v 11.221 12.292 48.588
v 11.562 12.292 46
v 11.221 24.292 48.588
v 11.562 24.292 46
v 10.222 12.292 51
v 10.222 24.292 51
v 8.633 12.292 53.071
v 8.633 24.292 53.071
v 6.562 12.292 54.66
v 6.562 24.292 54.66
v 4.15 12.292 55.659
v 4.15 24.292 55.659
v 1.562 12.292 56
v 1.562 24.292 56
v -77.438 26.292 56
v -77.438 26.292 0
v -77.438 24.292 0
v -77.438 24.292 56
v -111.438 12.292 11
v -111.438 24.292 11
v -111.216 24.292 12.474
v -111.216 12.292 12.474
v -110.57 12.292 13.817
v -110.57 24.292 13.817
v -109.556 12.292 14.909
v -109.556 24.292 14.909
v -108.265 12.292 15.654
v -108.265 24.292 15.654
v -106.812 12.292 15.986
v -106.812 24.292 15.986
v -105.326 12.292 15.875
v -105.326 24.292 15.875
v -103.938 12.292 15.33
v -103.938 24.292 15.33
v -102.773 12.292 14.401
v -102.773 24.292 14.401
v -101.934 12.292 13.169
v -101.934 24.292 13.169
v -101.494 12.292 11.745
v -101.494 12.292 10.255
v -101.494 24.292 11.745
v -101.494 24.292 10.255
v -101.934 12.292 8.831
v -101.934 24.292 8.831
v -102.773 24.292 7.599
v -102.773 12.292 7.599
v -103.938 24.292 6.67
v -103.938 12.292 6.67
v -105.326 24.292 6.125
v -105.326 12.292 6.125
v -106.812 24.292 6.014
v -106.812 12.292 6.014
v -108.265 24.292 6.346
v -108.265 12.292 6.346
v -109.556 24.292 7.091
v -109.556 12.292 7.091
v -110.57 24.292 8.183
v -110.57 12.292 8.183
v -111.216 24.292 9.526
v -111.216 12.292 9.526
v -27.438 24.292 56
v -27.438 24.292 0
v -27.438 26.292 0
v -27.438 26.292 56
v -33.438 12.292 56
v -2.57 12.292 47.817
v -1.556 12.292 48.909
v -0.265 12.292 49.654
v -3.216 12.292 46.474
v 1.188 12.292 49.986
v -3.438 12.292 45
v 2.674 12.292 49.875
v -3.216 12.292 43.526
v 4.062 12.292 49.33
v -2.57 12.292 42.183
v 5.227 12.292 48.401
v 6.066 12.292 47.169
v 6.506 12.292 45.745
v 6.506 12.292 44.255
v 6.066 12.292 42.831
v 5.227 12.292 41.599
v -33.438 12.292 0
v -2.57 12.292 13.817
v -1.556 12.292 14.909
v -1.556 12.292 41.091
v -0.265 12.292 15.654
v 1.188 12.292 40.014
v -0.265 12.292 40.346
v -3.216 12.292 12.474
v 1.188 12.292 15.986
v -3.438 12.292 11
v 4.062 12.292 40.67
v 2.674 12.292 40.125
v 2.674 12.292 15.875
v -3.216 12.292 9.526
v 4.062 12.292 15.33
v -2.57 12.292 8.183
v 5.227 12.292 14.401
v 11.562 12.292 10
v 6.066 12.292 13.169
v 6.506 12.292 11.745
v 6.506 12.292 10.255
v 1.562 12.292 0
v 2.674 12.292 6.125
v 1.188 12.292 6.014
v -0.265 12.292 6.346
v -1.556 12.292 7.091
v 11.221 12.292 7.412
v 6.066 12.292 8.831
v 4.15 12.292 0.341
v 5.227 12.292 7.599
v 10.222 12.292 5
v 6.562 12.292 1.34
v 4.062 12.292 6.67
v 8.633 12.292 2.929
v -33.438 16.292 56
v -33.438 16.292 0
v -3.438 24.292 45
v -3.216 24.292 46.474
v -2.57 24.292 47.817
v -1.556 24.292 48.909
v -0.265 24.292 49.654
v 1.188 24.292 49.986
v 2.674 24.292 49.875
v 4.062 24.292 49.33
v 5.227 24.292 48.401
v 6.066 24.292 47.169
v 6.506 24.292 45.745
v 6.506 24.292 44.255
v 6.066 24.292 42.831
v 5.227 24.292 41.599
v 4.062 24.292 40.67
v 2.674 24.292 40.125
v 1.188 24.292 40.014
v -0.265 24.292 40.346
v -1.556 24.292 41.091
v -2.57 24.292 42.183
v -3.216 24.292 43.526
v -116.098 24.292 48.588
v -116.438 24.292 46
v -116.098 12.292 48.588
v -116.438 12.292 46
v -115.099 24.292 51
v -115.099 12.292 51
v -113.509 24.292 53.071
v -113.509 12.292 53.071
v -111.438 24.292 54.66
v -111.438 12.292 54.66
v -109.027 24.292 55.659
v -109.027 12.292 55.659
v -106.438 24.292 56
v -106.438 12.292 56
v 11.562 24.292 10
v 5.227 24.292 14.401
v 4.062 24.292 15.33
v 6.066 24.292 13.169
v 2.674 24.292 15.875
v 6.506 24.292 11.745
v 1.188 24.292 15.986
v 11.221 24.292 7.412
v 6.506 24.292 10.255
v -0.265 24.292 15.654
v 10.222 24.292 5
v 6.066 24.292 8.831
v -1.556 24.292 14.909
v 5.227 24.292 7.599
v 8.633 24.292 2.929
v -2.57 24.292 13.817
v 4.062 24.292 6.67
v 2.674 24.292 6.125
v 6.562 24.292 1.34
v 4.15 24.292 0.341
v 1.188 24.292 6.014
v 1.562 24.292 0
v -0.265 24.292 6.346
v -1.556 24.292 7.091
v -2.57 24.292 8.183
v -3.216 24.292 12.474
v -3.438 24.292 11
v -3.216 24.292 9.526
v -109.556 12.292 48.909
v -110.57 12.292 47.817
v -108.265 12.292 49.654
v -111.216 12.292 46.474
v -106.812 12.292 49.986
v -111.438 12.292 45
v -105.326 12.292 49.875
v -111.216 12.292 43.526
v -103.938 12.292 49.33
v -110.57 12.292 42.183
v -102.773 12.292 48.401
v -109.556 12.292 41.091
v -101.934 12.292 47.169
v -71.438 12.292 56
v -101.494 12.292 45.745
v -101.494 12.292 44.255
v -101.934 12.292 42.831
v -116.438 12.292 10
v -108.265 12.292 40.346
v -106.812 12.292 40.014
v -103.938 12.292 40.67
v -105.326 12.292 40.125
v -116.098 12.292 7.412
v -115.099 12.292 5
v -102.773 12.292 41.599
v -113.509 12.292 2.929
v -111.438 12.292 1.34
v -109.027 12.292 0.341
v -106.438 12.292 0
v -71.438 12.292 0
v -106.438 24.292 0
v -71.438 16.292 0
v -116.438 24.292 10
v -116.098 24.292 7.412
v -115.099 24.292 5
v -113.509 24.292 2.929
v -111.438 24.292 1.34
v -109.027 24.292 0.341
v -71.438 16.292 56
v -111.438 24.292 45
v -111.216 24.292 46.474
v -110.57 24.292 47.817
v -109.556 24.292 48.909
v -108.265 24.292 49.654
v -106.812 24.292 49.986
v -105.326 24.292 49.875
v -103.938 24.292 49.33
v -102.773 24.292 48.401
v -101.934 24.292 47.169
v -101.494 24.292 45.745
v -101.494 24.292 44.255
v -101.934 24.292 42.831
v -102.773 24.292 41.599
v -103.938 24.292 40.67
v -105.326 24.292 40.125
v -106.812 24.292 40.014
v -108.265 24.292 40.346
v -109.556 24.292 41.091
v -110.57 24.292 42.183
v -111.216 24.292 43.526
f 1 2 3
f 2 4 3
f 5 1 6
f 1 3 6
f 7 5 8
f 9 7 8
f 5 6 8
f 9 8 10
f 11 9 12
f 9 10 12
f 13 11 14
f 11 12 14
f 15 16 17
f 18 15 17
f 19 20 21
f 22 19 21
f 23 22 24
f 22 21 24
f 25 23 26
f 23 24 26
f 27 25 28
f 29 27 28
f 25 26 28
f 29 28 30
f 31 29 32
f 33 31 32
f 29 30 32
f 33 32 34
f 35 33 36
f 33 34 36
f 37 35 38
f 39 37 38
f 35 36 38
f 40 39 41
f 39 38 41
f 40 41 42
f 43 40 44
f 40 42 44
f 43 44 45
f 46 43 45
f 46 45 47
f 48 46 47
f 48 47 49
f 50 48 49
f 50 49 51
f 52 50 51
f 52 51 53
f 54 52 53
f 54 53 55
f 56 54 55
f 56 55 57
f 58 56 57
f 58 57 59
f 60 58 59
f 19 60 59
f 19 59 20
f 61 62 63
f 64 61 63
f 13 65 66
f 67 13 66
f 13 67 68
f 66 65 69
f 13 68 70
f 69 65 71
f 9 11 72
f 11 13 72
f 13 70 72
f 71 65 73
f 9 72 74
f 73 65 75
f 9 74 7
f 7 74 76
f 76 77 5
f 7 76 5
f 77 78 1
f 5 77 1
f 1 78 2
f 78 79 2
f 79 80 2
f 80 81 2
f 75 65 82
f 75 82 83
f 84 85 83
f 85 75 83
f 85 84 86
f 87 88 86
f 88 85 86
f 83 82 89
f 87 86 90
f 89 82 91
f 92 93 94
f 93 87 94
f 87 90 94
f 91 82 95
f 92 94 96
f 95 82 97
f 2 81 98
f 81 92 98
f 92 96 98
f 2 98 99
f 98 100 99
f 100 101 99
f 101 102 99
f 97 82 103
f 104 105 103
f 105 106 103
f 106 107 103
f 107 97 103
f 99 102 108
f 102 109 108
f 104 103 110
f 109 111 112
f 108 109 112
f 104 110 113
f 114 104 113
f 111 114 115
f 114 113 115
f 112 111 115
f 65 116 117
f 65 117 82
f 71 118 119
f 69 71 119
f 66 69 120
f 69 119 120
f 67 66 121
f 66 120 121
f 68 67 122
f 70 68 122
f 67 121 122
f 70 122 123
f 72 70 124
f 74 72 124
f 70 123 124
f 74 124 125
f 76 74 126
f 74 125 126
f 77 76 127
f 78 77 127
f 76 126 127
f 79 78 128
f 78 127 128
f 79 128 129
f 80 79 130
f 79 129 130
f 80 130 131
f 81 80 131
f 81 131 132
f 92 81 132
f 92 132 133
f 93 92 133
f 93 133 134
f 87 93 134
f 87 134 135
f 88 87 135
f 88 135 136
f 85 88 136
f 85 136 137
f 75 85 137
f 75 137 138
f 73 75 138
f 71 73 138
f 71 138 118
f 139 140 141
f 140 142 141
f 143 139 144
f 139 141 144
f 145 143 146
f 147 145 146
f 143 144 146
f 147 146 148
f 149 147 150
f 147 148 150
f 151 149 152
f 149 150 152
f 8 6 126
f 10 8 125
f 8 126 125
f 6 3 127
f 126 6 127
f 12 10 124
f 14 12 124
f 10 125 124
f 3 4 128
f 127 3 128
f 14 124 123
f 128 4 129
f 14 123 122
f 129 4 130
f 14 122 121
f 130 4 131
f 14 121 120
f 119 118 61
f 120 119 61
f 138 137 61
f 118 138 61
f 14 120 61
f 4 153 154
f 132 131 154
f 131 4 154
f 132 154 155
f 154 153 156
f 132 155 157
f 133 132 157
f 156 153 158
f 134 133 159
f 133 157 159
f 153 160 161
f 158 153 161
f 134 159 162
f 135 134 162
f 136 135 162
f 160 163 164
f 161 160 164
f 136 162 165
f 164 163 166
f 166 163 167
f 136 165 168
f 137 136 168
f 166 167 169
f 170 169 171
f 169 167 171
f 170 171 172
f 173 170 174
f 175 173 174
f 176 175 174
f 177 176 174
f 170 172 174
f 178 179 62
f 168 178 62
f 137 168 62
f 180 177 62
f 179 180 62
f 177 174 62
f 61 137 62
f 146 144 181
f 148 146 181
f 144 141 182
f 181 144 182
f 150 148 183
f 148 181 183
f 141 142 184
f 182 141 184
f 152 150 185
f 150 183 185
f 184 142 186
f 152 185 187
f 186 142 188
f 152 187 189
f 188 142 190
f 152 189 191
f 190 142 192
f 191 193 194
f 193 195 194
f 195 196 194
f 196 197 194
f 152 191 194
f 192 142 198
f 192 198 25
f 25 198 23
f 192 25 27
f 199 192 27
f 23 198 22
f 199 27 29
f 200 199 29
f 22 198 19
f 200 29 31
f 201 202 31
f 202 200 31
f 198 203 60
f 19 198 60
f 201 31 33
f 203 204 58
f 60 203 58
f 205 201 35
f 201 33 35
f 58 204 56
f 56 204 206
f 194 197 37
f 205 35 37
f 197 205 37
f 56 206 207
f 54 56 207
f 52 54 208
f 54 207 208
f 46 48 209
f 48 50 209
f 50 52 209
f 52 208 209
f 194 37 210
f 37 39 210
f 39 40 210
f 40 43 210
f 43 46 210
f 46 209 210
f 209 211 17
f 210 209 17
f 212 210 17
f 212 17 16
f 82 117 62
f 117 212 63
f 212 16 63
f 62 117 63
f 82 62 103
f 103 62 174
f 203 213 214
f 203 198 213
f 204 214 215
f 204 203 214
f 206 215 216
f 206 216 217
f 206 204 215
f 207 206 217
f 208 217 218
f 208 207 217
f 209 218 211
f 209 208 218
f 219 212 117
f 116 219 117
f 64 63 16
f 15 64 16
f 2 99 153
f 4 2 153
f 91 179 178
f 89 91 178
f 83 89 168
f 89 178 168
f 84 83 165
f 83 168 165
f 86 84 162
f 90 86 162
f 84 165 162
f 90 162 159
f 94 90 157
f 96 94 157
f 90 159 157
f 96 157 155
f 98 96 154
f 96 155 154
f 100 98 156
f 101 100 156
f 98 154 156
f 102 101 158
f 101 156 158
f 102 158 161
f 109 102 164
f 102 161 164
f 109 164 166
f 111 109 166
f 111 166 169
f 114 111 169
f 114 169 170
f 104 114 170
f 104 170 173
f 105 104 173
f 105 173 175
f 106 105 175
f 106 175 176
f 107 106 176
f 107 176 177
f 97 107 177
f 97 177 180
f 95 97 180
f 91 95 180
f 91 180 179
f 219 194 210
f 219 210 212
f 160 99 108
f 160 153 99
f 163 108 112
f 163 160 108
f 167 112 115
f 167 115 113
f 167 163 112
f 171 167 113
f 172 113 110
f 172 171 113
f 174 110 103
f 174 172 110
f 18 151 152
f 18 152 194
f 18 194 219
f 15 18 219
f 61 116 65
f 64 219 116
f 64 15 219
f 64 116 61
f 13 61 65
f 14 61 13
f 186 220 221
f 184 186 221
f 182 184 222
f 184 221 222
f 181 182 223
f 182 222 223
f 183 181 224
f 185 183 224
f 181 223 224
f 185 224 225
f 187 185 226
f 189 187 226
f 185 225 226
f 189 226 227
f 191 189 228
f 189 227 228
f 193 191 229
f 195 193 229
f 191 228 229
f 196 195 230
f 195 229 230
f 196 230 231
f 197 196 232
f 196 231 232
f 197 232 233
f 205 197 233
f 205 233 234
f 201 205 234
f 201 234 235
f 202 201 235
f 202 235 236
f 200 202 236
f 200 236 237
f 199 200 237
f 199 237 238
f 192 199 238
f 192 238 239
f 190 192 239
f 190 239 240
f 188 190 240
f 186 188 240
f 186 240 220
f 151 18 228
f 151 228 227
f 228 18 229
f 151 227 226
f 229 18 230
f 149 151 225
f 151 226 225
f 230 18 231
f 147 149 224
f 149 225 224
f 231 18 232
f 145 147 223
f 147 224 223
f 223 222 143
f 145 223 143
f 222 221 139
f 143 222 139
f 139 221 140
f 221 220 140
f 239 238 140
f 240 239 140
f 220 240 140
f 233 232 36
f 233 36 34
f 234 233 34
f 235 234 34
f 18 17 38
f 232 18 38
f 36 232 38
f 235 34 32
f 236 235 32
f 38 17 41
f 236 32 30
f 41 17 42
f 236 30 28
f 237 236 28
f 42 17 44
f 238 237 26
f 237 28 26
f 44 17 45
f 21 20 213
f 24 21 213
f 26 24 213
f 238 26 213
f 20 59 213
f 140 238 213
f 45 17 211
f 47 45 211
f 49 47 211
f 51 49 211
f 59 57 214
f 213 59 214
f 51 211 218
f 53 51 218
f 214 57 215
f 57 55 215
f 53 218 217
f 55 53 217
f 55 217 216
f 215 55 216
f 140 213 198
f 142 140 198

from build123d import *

# Parameters (mm, degrees)
Y_KSEKLIK_EKSTR_ZYON1_DEPTH = 56
RADYUS1_R                   = 10
IZIM2_R                     = 5
KES_EKSTR_ZYON1_DEPTH       = 130.760913174


with BuildPart() as part:
    # Çizim1 → Yükseklik-Ekstrüzyon1 (new body)
    with BuildSketch(Plane.XY):
        Polygon((-33.438372489, 12.291666667), (11.561627511, 12.291666667), (11.561627511, 24.291666667), (-27.438372489, 24.291666667), (-27.438372489, 26.291666667), (-77.438372489, 26.291666667), (-77.438372489, 24.291666667), (-116.438372489, 24.291666667), (-116.438372489, 12.291666667), (-71.438372489, 12.291666667), (-71.438372489, 16.291666667), (-33.438372489, 16.291666667), align=None)
    extrude(amount=Y_KSEKLIK_EKSTR_ZYON1_DEPTH)

    # Radyus1
    radyus1_edges = [part.edges().sort_by_distance(p)[0] for p in [
        (11.561627511, 18.291666667, 0),
        (-116.438372489, 18.291666667, 0),
        (11.561627511, 18.291666667, 56),
        (-116.438372489, 18.291666667, 56),
    ]]
    fillet(radyus1_edges, radius=RADYUS1_R)

    # Çizim2 → Kes-Ekstrüzyon1 (cut, through all)
    with BuildSketch(Plane(origin=(0, 24.291666667, 0), x_dir=(1, 0, 0), z_dir=(0, 1, 0))):
        with Locations(Location((-106.438372489, -11, 0), (0, 0, 180))):
            Circle(IZIM2_R)
        with Locations(Location((-106.438372489, -45, 0), (0, 0, 180))):
            Circle(IZIM2_R)
        with Locations(Location((1.561627511, -45, 0), (0, 0, 180))):
            Circle(IZIM2_R)
        with Locations(Location((1.561627511, -11, 0), (0, 0, 180))):
            Circle(IZIM2_R)
    extrude(amount=-KES_EKSTR_ZYON1_DEPTH, mode=Mode.SUBTRACT)


solid = part.part
